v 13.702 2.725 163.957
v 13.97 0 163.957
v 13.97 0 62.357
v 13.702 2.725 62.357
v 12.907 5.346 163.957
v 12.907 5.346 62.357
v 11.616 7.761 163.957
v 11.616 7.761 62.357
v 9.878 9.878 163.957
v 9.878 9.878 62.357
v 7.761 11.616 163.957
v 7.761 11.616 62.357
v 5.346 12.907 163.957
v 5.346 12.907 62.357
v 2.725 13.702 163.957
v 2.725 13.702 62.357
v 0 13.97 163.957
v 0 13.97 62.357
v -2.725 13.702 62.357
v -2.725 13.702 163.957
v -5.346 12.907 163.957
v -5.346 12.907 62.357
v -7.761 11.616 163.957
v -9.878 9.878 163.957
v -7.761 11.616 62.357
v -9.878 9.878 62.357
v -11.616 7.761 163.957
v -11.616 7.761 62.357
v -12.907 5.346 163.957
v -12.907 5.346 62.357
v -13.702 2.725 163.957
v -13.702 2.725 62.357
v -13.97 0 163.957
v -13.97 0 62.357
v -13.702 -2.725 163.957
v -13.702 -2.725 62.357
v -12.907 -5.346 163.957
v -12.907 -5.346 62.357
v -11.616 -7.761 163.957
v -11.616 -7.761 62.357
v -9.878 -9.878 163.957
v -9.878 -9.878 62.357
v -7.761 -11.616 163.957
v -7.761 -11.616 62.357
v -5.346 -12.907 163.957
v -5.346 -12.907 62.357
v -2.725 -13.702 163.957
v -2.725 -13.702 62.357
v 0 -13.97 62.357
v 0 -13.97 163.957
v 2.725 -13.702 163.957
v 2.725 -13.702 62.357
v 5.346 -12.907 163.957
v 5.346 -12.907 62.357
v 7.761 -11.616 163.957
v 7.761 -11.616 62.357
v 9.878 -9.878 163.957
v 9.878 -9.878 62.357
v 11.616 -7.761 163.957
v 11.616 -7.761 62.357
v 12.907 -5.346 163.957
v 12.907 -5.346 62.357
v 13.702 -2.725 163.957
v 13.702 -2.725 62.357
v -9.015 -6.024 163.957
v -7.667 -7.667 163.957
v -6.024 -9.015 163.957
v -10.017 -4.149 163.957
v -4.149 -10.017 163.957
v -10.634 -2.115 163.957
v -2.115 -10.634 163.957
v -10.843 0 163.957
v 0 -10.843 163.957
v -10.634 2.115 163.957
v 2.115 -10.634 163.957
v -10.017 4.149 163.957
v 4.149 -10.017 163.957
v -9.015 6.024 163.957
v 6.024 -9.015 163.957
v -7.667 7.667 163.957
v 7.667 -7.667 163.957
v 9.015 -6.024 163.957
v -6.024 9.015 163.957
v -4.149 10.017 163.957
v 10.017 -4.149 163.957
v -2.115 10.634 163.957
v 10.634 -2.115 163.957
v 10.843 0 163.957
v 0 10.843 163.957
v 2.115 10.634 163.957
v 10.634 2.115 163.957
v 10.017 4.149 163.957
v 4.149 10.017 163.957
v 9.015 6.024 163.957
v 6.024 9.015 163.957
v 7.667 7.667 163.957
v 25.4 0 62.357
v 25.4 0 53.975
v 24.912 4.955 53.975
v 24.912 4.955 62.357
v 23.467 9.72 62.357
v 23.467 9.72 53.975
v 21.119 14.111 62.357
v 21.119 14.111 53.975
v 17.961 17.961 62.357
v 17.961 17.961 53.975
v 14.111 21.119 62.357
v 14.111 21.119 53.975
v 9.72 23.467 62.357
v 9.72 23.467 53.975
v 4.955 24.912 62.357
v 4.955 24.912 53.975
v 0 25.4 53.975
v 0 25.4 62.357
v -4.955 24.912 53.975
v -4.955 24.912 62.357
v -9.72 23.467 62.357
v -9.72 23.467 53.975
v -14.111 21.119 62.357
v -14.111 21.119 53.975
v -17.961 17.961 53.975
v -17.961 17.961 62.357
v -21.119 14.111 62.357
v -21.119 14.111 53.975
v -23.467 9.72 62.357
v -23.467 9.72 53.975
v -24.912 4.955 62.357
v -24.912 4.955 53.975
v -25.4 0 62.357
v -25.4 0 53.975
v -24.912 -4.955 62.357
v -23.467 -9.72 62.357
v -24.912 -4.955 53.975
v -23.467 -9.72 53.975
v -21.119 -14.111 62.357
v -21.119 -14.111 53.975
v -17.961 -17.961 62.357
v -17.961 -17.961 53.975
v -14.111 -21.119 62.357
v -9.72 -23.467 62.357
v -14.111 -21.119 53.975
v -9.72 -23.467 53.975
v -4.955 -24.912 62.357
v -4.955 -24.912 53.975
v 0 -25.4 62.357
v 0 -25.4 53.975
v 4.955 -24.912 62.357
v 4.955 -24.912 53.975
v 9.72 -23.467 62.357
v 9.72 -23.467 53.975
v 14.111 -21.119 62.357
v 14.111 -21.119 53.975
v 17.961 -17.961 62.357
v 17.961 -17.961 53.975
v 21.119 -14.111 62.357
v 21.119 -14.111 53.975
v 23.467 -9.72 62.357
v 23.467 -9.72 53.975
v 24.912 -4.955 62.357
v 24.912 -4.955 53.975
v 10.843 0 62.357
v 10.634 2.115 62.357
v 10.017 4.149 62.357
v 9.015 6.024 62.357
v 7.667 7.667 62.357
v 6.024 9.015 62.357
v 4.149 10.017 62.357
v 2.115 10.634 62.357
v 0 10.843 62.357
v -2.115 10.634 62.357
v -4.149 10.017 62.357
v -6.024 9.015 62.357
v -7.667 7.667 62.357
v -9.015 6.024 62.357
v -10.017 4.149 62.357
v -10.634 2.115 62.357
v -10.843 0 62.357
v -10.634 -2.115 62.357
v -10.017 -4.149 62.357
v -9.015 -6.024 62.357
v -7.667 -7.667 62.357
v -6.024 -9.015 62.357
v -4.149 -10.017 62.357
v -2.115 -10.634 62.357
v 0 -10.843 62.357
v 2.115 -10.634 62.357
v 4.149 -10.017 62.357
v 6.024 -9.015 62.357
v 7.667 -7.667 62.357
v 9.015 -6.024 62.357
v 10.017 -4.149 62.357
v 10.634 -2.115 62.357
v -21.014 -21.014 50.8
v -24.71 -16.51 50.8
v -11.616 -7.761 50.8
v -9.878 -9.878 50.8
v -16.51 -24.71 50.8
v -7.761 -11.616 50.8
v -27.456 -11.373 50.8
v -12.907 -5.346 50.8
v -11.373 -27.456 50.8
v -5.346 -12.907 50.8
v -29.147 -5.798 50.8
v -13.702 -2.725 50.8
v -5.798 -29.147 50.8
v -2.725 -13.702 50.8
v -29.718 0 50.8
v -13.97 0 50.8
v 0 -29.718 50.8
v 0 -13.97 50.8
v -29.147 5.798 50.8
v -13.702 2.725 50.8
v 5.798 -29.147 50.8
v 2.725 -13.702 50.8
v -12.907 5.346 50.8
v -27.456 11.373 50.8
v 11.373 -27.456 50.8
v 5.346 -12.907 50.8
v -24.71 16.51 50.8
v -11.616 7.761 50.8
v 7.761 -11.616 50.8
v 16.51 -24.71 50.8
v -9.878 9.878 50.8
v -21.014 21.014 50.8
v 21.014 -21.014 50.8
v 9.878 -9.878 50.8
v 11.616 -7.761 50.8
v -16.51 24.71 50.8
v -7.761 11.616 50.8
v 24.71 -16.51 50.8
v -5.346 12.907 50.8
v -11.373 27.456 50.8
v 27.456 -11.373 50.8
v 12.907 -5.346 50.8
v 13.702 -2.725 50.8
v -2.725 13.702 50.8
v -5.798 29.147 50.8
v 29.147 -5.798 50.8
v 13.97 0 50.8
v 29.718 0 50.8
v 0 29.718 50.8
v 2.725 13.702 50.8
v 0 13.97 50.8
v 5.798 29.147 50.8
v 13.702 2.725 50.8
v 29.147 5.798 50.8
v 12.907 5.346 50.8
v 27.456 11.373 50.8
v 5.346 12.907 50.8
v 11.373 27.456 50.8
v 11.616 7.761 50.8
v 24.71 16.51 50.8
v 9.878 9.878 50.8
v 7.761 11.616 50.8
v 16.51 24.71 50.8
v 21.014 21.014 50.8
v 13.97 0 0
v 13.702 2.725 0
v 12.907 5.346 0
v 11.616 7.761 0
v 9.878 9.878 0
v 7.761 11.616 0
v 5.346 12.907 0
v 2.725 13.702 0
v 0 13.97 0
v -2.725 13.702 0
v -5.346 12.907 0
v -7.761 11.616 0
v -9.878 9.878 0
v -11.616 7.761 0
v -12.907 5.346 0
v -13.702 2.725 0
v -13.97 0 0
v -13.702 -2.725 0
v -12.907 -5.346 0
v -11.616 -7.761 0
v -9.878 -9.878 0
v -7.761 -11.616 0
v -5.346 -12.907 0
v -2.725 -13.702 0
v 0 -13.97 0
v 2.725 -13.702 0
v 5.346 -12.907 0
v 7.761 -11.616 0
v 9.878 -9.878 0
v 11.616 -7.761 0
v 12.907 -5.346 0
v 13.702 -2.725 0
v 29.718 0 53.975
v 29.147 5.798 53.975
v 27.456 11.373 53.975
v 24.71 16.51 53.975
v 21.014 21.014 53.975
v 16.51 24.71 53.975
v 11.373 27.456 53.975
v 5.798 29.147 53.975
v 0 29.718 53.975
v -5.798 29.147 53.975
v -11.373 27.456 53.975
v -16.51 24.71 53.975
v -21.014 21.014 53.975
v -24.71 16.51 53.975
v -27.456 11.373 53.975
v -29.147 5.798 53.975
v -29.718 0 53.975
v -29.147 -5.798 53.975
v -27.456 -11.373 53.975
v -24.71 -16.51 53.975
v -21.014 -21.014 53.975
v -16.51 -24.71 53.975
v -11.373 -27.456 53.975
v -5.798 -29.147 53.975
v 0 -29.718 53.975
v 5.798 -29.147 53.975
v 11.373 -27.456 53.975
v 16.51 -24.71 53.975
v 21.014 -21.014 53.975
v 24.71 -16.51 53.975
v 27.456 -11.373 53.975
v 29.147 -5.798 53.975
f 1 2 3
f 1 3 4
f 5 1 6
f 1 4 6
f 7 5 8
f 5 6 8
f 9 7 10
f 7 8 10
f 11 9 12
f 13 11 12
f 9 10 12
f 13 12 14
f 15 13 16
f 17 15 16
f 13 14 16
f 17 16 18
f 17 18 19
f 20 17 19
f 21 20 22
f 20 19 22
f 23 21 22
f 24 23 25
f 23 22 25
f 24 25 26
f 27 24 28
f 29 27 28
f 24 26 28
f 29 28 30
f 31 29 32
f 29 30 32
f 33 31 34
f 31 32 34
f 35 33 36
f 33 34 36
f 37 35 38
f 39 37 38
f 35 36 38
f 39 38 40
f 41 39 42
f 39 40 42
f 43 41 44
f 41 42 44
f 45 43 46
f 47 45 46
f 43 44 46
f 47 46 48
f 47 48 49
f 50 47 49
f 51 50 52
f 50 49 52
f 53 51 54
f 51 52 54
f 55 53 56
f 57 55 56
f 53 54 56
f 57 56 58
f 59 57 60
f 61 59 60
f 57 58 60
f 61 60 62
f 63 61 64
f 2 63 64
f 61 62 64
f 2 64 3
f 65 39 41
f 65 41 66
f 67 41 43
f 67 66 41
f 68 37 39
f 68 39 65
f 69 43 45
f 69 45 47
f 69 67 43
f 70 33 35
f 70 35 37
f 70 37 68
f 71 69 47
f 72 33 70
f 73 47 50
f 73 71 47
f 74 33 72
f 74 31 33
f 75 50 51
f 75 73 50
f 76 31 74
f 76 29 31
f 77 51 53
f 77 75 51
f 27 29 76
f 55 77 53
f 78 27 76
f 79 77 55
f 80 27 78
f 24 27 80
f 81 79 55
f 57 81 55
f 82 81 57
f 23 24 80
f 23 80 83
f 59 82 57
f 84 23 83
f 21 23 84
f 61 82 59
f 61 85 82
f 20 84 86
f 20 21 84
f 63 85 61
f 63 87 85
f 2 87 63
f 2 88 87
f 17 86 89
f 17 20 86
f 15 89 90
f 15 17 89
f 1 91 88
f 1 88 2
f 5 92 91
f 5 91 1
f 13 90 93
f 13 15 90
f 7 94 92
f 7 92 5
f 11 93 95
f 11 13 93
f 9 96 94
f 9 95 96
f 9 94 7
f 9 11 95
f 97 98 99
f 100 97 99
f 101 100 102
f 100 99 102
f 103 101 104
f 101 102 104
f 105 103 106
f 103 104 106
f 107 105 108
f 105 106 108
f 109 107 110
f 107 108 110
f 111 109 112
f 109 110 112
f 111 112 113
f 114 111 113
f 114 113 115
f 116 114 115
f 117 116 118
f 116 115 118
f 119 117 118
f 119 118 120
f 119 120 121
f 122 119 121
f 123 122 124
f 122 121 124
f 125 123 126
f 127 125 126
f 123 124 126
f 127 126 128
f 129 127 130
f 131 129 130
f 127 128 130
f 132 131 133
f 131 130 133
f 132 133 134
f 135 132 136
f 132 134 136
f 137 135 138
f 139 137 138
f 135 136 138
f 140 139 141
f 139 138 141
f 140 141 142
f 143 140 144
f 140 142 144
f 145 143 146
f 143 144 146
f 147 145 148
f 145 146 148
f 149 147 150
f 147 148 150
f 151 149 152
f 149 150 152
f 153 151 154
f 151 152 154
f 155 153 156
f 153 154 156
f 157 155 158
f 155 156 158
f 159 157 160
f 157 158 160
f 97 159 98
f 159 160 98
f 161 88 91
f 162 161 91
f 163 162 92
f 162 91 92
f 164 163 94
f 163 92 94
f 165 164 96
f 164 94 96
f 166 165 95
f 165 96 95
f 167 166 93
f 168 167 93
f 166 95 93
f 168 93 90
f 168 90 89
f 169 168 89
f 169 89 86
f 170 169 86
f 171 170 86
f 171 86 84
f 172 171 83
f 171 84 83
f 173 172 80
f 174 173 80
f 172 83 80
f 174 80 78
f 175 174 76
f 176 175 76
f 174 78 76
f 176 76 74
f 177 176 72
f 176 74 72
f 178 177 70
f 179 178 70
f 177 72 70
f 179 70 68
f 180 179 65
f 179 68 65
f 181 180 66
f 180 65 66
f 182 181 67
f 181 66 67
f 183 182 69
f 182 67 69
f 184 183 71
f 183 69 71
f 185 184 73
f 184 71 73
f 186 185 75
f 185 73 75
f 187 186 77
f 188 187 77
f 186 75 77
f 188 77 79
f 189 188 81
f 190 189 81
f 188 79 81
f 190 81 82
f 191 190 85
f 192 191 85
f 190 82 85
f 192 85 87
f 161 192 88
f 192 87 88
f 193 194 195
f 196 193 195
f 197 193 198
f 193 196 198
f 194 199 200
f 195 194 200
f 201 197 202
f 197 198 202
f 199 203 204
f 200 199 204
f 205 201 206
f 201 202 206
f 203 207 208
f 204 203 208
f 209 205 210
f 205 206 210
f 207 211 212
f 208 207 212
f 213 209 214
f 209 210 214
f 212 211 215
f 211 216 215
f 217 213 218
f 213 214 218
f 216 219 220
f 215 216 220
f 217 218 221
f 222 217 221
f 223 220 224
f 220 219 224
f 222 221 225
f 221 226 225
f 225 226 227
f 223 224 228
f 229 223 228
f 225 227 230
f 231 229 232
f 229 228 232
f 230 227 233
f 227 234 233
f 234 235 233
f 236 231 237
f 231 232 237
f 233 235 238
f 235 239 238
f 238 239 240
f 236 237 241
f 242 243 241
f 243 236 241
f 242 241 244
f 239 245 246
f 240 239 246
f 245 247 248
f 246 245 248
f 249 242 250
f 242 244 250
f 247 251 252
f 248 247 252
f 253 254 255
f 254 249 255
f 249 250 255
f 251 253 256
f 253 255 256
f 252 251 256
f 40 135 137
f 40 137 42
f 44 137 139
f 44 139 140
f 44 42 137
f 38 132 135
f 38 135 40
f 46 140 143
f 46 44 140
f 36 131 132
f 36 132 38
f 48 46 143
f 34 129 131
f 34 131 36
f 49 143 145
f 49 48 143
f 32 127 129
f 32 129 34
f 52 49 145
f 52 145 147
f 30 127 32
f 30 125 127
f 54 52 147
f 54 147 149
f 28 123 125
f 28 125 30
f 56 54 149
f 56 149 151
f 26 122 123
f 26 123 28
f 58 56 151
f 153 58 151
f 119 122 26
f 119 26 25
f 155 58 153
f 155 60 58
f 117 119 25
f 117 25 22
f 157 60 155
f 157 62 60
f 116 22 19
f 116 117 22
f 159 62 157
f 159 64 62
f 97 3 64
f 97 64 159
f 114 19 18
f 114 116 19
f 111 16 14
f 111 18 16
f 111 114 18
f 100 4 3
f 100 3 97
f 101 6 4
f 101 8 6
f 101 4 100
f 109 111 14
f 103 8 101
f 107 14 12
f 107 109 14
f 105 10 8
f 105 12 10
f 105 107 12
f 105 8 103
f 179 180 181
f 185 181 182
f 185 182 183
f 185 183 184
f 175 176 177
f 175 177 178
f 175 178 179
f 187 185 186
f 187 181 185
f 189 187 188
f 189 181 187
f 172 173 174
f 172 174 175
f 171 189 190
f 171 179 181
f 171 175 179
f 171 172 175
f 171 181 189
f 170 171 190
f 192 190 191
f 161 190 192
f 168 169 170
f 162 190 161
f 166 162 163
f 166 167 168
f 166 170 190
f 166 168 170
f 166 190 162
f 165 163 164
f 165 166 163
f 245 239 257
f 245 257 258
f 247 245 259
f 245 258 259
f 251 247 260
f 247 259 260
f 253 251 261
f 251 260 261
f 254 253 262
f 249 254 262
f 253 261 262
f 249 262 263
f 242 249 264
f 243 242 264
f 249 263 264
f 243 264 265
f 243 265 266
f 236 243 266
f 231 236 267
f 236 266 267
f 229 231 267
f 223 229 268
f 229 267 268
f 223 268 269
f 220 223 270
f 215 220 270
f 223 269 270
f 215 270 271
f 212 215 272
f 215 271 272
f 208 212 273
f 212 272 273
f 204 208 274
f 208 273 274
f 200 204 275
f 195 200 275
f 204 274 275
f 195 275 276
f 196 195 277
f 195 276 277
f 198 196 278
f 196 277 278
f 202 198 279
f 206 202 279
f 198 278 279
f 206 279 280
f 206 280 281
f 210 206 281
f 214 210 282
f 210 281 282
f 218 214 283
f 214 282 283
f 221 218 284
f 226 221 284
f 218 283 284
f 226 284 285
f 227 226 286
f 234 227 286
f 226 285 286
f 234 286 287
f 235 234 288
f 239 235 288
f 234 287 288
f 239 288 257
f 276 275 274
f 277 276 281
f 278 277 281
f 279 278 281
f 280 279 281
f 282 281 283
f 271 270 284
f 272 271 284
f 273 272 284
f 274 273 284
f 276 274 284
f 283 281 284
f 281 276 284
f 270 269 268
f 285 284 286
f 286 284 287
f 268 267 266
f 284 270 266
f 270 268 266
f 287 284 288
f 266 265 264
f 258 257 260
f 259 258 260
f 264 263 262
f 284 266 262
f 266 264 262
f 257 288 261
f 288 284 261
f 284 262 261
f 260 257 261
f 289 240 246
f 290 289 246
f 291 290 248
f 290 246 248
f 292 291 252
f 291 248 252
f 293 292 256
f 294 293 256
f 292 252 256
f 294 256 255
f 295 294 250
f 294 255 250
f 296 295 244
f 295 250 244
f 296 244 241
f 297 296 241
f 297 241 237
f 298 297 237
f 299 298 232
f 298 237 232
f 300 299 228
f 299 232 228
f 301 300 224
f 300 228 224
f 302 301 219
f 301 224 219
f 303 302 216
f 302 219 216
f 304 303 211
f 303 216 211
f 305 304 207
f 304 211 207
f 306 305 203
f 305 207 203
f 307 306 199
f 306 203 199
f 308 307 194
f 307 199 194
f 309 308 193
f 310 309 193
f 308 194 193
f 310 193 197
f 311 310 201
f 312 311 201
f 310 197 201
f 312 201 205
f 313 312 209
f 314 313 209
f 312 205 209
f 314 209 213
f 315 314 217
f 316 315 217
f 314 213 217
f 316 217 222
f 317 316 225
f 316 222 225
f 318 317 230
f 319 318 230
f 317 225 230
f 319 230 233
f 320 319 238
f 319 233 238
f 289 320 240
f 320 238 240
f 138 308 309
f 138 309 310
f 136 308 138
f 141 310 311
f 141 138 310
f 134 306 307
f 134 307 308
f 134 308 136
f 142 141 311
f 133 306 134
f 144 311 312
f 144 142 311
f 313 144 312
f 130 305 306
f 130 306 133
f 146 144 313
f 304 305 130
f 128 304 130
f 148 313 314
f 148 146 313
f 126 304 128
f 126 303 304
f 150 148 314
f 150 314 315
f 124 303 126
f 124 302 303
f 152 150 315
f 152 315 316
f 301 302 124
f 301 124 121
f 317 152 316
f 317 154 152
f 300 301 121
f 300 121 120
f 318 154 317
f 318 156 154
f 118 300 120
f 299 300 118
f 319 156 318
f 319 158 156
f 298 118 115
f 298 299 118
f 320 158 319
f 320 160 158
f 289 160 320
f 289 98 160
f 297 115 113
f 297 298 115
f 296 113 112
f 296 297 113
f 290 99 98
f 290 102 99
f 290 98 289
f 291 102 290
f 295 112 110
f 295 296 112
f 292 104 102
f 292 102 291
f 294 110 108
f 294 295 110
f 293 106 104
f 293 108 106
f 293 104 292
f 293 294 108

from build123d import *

# Parameters (mm, degrees)
SKETCH1_R           = 13.97
BOSS_EXTRUDE2_DEPTH = 50.8
SKETCH2_R           = 29.718
BOSS_EXTRUDE3_DEPTH = 3.175
SKETCH3_R           = 25.4
BOSS_EXTRUDE4_DEPTH = 8.382
SKETCH4_R           = 13.97
BOSS_EXTRUDE5_DEPTH = 101.6
SKETCH5_R           = 10.842824112
CUT_EXTRUDE1_DEPTH  = 101.6


with BuildPart() as part:
    # Sketch1 → Boss-Extrude2 (new body)
    with BuildSketch(Plane.XY):
        Circle(SKETCH1_R)
    extrude(amount=BOSS_EXTRUDE2_DEPTH)

    # Sketch2 → Boss-Extrude3 (add)
    with BuildSketch(Plane.XY.offset(50.8)):
        Circle(SKETCH2_R)
    extrude(amount=BOSS_EXTRUDE3_DEPTH)

    # Sketch3 → Boss-Extrude4 (add)
    with BuildSketch(Plane.XY.offset(53.975)):
        Circle(SKETCH3_R)
    extrude(amount=BOSS_EXTRUDE4_DEPTH)

    # Sketch4 → Boss-Extrude5 (add)
    with BuildSketch(Plane.XY.offset(62.357)):
        Circle(SKETCH4_R)
    extrude(amount=BOSS_EXTRUDE5_DEPTH)

    # Sketch5 → Cut-Extrude1 (cut)
    with BuildSketch(Plane.XY.offset(163.957)):
        Circle(SKETCH5_R)
    extrude(amount=-CUT_EXTRUDE1_DEPTH, mode=Mode.SUBTRACT)


solid = part.part
